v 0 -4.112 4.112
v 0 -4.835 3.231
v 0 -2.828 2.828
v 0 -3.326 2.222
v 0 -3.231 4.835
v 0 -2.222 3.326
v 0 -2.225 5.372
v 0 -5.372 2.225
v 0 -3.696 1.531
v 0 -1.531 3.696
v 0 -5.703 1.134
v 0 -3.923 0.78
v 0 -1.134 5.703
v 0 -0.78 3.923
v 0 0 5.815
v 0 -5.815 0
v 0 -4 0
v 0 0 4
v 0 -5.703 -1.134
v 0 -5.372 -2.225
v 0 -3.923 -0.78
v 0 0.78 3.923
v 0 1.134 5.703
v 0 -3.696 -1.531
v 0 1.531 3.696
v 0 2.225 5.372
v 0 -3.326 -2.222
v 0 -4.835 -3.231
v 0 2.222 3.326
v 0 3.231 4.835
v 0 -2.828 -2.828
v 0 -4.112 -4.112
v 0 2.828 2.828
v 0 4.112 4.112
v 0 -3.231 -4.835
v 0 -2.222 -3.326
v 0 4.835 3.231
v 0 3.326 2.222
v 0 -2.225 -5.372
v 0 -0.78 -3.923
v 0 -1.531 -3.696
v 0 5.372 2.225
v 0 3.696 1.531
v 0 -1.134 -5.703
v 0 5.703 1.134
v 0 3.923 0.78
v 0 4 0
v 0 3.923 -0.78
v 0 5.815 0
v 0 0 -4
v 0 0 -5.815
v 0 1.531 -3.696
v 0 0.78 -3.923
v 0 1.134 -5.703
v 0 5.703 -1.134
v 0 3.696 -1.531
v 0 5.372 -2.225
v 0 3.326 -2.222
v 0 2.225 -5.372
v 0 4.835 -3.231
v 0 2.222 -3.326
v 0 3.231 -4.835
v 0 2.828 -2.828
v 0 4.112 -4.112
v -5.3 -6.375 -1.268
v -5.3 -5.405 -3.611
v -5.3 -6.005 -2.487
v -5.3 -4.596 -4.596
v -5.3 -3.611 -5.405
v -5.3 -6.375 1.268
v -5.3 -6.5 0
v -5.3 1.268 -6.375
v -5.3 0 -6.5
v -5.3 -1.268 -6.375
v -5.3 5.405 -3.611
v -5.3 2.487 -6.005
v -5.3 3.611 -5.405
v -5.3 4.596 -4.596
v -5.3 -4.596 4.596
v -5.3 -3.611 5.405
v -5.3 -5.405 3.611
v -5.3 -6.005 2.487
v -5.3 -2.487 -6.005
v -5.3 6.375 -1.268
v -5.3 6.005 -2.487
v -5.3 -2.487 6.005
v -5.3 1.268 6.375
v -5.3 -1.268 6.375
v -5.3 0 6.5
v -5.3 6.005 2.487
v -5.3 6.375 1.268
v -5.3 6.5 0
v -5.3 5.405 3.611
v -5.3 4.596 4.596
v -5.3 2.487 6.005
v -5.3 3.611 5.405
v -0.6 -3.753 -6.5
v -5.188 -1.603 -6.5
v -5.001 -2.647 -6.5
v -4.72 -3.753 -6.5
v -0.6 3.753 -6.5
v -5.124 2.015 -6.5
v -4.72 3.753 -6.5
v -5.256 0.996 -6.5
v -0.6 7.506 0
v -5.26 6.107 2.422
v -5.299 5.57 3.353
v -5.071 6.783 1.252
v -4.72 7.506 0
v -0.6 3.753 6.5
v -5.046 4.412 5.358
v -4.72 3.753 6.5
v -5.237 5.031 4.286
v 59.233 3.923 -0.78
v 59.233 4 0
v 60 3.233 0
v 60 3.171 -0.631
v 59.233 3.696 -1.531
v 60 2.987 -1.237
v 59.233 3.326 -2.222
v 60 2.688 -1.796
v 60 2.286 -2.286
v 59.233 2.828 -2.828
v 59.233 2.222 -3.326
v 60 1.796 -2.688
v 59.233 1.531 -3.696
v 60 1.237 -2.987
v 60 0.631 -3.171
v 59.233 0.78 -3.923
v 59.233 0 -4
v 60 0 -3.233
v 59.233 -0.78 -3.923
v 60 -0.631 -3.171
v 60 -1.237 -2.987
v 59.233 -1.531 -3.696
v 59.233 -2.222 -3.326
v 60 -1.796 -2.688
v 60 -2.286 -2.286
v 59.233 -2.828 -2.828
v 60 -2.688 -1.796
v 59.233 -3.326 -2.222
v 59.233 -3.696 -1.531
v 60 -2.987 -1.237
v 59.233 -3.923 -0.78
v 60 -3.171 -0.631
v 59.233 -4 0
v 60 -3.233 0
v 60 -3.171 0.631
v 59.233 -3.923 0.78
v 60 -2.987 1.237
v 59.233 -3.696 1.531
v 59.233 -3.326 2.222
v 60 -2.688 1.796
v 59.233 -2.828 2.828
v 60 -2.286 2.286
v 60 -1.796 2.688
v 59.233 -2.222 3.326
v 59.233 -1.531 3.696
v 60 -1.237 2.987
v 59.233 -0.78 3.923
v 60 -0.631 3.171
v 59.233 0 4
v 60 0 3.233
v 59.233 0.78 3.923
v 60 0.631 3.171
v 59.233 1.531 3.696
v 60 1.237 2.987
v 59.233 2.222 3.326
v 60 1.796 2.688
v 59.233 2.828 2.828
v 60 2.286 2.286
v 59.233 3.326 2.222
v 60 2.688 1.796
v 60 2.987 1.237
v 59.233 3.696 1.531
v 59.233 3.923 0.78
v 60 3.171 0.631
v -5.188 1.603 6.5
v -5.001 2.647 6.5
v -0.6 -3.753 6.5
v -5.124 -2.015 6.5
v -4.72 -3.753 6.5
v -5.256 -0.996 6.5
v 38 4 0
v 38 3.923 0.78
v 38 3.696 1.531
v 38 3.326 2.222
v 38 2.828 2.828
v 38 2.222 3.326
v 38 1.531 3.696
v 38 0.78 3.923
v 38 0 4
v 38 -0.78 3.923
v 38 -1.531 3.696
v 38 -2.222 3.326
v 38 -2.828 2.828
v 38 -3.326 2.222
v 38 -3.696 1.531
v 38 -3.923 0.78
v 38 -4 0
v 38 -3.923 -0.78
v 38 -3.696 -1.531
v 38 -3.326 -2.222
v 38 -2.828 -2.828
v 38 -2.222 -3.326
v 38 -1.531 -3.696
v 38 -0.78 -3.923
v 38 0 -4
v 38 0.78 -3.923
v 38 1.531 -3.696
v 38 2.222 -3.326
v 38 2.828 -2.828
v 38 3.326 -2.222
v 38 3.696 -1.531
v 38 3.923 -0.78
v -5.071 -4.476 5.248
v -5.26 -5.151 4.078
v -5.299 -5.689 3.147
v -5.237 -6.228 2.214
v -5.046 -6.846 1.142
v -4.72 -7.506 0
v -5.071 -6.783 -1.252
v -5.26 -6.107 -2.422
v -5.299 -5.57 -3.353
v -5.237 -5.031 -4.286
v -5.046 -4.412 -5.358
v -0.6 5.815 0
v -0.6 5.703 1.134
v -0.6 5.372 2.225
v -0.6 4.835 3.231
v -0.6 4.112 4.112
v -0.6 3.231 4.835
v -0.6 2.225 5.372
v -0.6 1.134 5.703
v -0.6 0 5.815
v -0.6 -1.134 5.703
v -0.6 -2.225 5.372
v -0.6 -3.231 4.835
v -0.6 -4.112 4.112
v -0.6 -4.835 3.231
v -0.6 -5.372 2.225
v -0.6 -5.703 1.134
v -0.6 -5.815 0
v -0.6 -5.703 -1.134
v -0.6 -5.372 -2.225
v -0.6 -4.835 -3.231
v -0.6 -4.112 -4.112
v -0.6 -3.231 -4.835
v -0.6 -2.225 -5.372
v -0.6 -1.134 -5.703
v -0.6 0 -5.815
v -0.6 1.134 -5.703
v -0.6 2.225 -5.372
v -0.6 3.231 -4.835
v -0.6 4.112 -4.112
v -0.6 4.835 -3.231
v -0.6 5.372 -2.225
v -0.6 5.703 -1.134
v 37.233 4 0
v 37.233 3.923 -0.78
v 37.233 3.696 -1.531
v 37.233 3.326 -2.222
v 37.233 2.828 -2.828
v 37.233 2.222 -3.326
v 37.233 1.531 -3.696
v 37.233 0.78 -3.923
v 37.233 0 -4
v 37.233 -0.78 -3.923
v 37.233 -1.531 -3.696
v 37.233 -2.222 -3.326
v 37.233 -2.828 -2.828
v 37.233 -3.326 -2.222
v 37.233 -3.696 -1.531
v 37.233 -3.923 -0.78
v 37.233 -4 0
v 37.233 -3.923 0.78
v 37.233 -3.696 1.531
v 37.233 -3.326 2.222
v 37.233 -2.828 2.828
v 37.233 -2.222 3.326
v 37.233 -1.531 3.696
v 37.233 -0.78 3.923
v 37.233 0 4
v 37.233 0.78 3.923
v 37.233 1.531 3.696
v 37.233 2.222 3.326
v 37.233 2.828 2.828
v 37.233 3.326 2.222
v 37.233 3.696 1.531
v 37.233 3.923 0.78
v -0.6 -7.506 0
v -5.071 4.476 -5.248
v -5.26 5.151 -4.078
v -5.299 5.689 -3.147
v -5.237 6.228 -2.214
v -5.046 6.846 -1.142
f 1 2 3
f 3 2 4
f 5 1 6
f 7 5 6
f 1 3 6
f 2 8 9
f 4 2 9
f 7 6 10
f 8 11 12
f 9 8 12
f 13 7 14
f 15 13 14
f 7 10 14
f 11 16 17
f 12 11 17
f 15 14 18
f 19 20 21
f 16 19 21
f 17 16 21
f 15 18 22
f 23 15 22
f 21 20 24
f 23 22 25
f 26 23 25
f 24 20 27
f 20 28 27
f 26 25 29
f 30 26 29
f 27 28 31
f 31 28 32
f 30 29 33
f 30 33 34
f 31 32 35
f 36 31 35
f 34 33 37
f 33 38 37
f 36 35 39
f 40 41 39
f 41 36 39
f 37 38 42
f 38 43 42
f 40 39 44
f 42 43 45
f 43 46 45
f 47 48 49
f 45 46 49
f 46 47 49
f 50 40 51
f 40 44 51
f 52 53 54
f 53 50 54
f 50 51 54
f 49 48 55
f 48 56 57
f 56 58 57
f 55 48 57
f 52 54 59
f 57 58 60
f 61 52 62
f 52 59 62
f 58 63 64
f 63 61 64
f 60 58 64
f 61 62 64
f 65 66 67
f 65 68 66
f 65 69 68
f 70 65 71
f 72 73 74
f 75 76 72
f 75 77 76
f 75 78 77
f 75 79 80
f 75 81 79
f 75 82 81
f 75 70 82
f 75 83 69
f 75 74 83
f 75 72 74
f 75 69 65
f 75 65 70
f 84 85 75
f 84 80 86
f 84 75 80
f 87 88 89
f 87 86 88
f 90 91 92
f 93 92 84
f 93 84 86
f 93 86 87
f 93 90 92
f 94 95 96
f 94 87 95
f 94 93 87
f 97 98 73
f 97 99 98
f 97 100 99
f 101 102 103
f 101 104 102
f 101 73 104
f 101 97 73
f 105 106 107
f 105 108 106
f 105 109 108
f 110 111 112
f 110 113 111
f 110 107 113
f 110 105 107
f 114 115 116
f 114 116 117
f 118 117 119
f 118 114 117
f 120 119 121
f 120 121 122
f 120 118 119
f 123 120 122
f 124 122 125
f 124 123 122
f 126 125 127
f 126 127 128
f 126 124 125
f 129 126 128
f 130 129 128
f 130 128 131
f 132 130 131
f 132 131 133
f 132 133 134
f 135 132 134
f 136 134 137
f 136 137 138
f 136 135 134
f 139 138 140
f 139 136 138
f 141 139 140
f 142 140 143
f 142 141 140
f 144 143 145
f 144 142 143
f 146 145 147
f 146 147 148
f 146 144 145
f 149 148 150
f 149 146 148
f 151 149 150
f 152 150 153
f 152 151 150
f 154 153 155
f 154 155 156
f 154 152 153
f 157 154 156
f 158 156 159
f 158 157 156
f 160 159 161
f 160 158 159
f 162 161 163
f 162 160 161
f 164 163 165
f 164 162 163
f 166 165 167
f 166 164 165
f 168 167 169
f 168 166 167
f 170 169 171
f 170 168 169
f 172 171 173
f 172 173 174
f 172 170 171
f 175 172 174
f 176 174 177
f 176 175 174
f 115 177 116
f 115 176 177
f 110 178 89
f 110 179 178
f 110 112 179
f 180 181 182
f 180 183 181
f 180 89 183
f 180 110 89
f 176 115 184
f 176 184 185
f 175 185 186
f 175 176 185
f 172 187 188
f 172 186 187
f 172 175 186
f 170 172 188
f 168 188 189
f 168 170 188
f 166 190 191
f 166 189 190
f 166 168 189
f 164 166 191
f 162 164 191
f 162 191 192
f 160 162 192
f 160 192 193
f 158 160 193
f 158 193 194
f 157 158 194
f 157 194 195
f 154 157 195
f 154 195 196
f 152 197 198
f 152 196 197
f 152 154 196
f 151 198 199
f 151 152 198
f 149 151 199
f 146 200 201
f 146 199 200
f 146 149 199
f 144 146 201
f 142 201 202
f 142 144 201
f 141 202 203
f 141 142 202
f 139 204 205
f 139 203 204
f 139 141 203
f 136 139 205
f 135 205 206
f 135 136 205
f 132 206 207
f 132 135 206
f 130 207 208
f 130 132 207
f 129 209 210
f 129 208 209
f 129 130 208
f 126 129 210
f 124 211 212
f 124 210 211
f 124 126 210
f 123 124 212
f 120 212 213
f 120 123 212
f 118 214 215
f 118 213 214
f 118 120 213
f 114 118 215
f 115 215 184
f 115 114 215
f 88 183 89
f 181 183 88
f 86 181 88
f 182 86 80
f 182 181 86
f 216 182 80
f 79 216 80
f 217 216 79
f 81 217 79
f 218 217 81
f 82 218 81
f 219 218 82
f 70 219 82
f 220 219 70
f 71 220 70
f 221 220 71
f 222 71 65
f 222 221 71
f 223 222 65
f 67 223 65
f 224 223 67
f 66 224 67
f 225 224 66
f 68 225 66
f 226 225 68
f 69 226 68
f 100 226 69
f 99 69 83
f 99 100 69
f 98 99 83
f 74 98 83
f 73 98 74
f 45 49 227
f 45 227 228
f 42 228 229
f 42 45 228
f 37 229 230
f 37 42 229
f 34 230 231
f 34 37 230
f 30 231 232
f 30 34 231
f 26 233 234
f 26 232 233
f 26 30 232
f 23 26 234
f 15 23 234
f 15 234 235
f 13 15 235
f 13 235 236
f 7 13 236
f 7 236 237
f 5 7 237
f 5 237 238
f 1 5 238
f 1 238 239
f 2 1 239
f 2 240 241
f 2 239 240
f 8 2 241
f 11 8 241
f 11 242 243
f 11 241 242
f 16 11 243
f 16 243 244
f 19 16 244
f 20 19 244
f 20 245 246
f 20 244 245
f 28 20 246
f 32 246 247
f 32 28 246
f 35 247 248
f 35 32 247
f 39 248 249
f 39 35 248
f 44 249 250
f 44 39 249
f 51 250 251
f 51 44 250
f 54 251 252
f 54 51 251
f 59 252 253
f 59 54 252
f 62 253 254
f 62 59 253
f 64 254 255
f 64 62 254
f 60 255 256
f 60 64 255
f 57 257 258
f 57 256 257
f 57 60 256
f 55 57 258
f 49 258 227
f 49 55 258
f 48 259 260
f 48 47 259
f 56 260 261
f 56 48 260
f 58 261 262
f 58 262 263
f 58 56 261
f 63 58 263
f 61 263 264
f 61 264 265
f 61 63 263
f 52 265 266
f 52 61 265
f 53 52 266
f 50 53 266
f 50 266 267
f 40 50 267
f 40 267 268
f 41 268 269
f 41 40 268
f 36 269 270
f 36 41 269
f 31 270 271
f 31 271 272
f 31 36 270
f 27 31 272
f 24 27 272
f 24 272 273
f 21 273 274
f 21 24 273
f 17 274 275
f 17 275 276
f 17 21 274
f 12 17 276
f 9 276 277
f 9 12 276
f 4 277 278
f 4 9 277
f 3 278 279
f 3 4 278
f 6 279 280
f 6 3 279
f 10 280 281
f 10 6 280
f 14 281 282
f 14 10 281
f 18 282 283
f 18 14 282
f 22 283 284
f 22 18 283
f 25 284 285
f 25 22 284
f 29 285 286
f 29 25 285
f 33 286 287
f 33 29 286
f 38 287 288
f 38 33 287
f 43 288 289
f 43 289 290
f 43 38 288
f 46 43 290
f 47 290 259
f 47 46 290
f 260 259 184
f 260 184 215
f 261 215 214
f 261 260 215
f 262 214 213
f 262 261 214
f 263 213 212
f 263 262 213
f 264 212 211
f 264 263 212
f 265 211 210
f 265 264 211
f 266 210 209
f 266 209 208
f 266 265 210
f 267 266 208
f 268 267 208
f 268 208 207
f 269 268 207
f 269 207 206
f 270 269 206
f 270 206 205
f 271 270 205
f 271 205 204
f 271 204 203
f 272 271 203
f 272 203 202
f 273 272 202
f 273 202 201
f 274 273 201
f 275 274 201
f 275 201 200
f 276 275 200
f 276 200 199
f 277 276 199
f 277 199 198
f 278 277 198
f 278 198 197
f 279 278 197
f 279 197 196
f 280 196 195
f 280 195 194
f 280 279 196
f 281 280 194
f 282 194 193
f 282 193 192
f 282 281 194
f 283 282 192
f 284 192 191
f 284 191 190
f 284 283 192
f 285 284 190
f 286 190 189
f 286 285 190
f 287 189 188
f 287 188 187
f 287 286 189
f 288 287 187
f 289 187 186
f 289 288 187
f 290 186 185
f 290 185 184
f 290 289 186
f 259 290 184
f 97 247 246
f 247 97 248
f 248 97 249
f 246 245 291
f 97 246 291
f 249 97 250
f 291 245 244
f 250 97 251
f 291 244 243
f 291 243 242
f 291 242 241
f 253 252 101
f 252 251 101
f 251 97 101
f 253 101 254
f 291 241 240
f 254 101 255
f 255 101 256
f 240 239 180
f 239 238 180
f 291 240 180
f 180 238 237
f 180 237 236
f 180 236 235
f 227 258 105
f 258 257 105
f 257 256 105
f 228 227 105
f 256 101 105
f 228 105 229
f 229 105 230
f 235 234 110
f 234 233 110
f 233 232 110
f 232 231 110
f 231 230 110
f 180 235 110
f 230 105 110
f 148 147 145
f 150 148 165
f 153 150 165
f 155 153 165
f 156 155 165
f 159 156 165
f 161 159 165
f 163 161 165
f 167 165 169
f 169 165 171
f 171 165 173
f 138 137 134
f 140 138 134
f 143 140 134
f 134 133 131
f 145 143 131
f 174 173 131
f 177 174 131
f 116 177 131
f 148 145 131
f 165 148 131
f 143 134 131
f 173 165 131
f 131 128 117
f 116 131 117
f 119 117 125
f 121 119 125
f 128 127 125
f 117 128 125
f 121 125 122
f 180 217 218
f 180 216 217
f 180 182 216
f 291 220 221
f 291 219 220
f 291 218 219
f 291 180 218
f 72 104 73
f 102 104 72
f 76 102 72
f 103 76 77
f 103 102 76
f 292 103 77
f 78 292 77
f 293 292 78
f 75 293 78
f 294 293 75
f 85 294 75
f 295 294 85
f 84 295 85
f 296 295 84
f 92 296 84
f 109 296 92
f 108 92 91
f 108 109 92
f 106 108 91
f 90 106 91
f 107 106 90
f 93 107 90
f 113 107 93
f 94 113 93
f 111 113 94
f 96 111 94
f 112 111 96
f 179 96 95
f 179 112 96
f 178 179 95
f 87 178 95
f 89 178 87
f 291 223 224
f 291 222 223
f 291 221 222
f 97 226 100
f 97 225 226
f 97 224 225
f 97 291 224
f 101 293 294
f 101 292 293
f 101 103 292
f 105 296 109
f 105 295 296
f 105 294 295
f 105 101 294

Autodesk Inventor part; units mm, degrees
ref_plane "YZ Plane" through (0, 0, 0) normal (1, 0, 0) x (0, 1, 0)
ref_plane "XZ Plane" through (0, 0, 0) normal (0, 1, 0) x (-1, 0, 0)
sketch "Sketch1" plane through (0, 0, 0) normal (0, 0, 1) x (1, 0, 0)
  line L0 (0, 5.815) -> (0, 4)
  line L1 (38, 4) -> (60, 4)
  line L2 (60, 4) -> (60, 0)
  line L3 (60, 0) -> (-0.6001, 0)
  line L4 (-12.7201, 0) -> (72.12, 0) projected
  line L5 (-0.6001, 0) -> (-0.6001, 5.815)
  line L6 (-0.6001, 5.815) -> (0, 5.815)
  line L7 (38, 4) -> (37.2331, 4)
  line L8 (37.2331, 4) -> (0, 4)
  line L9 (0, -1.163) -> (0, 6.978) projected
  dimension "d0" = 60
  dimension "d1" = 22
  dimension "d2" = 8
  dimension "d9" = 0.6001
  dimension "d10" = 11.63
  dimension "d13" = 0.7669
  dimension "d14" = 8
revolve "Body" add sketch "Sketch1" angle 360 about axis through (60, 0, 0) along (-1, 0, 0)
sketch "Sketch2" plane through (-0.6001, 0, 0) normal (-1, 0, 0) x (0, 0, 1)
  line L0 (0, 7.5056) -> (6.5, 3.7528)
  line L1 (6.5, 3.7528) -> (6.5, -3.7528)
  line L2 (6.5, -3.7528) -> (0, -7.5056)
  line L3 (0, -7.5056) -> (-6.5, -3.7528)
  line L4 (-6.5, -3.7528) -> (-6.5, 3.7528)
  line L5 (-6.5, 3.7528) -> (0, 7.5056)
  point P0 (0, 0)
  point P1 (0, 0)
  dimension "d11" = 13
extrude "Head" add sketch "Sketch2" along normal blind 4.7
sketch "Sketch4" plane through (0, 0, 0) normal (0, 0, 1) x (1, 0, 0)
  line L0 (-5.3001, 6.5) -> (-5.3001, 7.5056)
  line L1 (-5.3001, 7.5056) -> (-4.7195, 7.5056)
  line L2 (-4.7195, 7.5056) -> (-5.3001, 6.5)
  line L3 (-6.2401, 0) -> (0.3399, 0) projected
  line L4 (-0.6001, 7.5056) -> (-5.3001, 7.5056) projected
  line L5 (-5.3001, 3.7528) -> (-5.3001, 7.5056) projected
  dimension "d5" = 30
  dimension "d19" = 13
revolve "Chamfer1" cut sketch "Sketch4" angle 360 about axis through (-10, 0, 0) along (1, 0, 0)
thread "Thread" size "M8x1.25" class "6g" standard "ISO Metric profile" length 22
chamfer "Chamfer2" distance 0.7668 distance2 0.7669 1 edges at (60, -4, 0) measured on face at (60, -0.1514, -1.2467)
ref_plane "Work Plane1" through (1.525, 0, 0) normal (0, 0, 1) x (1, 0, 0)
equation "\"d0\" = NLG"
equation "\"d1\" = GEL"
equation "\"d2\" = GD"
equation "\"d10\" = SD2"
equation "\"d14\" = BDM"
equation "\"d11\" = SW"
equation "\"d3\" = KOH - SD"
equation "\"d5\" = ANG1"
equation "\"d19\" = SW0"
equation "\"d15\" = GEL"
equation "\"d6\" = -0.5 * SPD + 0.5 * GD"
equation "\"NLG\" = 60"
equation "\"GD\" = NND"
equation "\"BDM\" = NND"
equation "\"KOH\" = 5.3"
equation "\"GEL\" = 22"
equation "\"SW\" = 13"
equation "\"SW0\" = SW"
equation "\"SPD\" = NND - 1.2269 * PTC"
equation "\"SD2\" = 11.63"
equation "\"SD\" = 0.6"
equation "\"ANG1\" = 30deg"
equation "\"GAL\" = 0.61345 * PTC"
equation "\"GUL\" = 0.61345 * PTC"
equation "\"RR\" = 0.4"
equation "\"GD1\" = THREADDIA - 1.2269 * PTC"
equation "\"THREADDIA\" = 8"
equation "\"SDH\" = SD2"
equation "\"TOA\" = 30deg"
equation "\"PTC\" = 1.25"
equation "\"NND\" = 8"
equation "\"E0\" = 1.155 * SW"
properties part number "ISO 4014 - M8 x 60" material "Stainless Steel, 440C"
